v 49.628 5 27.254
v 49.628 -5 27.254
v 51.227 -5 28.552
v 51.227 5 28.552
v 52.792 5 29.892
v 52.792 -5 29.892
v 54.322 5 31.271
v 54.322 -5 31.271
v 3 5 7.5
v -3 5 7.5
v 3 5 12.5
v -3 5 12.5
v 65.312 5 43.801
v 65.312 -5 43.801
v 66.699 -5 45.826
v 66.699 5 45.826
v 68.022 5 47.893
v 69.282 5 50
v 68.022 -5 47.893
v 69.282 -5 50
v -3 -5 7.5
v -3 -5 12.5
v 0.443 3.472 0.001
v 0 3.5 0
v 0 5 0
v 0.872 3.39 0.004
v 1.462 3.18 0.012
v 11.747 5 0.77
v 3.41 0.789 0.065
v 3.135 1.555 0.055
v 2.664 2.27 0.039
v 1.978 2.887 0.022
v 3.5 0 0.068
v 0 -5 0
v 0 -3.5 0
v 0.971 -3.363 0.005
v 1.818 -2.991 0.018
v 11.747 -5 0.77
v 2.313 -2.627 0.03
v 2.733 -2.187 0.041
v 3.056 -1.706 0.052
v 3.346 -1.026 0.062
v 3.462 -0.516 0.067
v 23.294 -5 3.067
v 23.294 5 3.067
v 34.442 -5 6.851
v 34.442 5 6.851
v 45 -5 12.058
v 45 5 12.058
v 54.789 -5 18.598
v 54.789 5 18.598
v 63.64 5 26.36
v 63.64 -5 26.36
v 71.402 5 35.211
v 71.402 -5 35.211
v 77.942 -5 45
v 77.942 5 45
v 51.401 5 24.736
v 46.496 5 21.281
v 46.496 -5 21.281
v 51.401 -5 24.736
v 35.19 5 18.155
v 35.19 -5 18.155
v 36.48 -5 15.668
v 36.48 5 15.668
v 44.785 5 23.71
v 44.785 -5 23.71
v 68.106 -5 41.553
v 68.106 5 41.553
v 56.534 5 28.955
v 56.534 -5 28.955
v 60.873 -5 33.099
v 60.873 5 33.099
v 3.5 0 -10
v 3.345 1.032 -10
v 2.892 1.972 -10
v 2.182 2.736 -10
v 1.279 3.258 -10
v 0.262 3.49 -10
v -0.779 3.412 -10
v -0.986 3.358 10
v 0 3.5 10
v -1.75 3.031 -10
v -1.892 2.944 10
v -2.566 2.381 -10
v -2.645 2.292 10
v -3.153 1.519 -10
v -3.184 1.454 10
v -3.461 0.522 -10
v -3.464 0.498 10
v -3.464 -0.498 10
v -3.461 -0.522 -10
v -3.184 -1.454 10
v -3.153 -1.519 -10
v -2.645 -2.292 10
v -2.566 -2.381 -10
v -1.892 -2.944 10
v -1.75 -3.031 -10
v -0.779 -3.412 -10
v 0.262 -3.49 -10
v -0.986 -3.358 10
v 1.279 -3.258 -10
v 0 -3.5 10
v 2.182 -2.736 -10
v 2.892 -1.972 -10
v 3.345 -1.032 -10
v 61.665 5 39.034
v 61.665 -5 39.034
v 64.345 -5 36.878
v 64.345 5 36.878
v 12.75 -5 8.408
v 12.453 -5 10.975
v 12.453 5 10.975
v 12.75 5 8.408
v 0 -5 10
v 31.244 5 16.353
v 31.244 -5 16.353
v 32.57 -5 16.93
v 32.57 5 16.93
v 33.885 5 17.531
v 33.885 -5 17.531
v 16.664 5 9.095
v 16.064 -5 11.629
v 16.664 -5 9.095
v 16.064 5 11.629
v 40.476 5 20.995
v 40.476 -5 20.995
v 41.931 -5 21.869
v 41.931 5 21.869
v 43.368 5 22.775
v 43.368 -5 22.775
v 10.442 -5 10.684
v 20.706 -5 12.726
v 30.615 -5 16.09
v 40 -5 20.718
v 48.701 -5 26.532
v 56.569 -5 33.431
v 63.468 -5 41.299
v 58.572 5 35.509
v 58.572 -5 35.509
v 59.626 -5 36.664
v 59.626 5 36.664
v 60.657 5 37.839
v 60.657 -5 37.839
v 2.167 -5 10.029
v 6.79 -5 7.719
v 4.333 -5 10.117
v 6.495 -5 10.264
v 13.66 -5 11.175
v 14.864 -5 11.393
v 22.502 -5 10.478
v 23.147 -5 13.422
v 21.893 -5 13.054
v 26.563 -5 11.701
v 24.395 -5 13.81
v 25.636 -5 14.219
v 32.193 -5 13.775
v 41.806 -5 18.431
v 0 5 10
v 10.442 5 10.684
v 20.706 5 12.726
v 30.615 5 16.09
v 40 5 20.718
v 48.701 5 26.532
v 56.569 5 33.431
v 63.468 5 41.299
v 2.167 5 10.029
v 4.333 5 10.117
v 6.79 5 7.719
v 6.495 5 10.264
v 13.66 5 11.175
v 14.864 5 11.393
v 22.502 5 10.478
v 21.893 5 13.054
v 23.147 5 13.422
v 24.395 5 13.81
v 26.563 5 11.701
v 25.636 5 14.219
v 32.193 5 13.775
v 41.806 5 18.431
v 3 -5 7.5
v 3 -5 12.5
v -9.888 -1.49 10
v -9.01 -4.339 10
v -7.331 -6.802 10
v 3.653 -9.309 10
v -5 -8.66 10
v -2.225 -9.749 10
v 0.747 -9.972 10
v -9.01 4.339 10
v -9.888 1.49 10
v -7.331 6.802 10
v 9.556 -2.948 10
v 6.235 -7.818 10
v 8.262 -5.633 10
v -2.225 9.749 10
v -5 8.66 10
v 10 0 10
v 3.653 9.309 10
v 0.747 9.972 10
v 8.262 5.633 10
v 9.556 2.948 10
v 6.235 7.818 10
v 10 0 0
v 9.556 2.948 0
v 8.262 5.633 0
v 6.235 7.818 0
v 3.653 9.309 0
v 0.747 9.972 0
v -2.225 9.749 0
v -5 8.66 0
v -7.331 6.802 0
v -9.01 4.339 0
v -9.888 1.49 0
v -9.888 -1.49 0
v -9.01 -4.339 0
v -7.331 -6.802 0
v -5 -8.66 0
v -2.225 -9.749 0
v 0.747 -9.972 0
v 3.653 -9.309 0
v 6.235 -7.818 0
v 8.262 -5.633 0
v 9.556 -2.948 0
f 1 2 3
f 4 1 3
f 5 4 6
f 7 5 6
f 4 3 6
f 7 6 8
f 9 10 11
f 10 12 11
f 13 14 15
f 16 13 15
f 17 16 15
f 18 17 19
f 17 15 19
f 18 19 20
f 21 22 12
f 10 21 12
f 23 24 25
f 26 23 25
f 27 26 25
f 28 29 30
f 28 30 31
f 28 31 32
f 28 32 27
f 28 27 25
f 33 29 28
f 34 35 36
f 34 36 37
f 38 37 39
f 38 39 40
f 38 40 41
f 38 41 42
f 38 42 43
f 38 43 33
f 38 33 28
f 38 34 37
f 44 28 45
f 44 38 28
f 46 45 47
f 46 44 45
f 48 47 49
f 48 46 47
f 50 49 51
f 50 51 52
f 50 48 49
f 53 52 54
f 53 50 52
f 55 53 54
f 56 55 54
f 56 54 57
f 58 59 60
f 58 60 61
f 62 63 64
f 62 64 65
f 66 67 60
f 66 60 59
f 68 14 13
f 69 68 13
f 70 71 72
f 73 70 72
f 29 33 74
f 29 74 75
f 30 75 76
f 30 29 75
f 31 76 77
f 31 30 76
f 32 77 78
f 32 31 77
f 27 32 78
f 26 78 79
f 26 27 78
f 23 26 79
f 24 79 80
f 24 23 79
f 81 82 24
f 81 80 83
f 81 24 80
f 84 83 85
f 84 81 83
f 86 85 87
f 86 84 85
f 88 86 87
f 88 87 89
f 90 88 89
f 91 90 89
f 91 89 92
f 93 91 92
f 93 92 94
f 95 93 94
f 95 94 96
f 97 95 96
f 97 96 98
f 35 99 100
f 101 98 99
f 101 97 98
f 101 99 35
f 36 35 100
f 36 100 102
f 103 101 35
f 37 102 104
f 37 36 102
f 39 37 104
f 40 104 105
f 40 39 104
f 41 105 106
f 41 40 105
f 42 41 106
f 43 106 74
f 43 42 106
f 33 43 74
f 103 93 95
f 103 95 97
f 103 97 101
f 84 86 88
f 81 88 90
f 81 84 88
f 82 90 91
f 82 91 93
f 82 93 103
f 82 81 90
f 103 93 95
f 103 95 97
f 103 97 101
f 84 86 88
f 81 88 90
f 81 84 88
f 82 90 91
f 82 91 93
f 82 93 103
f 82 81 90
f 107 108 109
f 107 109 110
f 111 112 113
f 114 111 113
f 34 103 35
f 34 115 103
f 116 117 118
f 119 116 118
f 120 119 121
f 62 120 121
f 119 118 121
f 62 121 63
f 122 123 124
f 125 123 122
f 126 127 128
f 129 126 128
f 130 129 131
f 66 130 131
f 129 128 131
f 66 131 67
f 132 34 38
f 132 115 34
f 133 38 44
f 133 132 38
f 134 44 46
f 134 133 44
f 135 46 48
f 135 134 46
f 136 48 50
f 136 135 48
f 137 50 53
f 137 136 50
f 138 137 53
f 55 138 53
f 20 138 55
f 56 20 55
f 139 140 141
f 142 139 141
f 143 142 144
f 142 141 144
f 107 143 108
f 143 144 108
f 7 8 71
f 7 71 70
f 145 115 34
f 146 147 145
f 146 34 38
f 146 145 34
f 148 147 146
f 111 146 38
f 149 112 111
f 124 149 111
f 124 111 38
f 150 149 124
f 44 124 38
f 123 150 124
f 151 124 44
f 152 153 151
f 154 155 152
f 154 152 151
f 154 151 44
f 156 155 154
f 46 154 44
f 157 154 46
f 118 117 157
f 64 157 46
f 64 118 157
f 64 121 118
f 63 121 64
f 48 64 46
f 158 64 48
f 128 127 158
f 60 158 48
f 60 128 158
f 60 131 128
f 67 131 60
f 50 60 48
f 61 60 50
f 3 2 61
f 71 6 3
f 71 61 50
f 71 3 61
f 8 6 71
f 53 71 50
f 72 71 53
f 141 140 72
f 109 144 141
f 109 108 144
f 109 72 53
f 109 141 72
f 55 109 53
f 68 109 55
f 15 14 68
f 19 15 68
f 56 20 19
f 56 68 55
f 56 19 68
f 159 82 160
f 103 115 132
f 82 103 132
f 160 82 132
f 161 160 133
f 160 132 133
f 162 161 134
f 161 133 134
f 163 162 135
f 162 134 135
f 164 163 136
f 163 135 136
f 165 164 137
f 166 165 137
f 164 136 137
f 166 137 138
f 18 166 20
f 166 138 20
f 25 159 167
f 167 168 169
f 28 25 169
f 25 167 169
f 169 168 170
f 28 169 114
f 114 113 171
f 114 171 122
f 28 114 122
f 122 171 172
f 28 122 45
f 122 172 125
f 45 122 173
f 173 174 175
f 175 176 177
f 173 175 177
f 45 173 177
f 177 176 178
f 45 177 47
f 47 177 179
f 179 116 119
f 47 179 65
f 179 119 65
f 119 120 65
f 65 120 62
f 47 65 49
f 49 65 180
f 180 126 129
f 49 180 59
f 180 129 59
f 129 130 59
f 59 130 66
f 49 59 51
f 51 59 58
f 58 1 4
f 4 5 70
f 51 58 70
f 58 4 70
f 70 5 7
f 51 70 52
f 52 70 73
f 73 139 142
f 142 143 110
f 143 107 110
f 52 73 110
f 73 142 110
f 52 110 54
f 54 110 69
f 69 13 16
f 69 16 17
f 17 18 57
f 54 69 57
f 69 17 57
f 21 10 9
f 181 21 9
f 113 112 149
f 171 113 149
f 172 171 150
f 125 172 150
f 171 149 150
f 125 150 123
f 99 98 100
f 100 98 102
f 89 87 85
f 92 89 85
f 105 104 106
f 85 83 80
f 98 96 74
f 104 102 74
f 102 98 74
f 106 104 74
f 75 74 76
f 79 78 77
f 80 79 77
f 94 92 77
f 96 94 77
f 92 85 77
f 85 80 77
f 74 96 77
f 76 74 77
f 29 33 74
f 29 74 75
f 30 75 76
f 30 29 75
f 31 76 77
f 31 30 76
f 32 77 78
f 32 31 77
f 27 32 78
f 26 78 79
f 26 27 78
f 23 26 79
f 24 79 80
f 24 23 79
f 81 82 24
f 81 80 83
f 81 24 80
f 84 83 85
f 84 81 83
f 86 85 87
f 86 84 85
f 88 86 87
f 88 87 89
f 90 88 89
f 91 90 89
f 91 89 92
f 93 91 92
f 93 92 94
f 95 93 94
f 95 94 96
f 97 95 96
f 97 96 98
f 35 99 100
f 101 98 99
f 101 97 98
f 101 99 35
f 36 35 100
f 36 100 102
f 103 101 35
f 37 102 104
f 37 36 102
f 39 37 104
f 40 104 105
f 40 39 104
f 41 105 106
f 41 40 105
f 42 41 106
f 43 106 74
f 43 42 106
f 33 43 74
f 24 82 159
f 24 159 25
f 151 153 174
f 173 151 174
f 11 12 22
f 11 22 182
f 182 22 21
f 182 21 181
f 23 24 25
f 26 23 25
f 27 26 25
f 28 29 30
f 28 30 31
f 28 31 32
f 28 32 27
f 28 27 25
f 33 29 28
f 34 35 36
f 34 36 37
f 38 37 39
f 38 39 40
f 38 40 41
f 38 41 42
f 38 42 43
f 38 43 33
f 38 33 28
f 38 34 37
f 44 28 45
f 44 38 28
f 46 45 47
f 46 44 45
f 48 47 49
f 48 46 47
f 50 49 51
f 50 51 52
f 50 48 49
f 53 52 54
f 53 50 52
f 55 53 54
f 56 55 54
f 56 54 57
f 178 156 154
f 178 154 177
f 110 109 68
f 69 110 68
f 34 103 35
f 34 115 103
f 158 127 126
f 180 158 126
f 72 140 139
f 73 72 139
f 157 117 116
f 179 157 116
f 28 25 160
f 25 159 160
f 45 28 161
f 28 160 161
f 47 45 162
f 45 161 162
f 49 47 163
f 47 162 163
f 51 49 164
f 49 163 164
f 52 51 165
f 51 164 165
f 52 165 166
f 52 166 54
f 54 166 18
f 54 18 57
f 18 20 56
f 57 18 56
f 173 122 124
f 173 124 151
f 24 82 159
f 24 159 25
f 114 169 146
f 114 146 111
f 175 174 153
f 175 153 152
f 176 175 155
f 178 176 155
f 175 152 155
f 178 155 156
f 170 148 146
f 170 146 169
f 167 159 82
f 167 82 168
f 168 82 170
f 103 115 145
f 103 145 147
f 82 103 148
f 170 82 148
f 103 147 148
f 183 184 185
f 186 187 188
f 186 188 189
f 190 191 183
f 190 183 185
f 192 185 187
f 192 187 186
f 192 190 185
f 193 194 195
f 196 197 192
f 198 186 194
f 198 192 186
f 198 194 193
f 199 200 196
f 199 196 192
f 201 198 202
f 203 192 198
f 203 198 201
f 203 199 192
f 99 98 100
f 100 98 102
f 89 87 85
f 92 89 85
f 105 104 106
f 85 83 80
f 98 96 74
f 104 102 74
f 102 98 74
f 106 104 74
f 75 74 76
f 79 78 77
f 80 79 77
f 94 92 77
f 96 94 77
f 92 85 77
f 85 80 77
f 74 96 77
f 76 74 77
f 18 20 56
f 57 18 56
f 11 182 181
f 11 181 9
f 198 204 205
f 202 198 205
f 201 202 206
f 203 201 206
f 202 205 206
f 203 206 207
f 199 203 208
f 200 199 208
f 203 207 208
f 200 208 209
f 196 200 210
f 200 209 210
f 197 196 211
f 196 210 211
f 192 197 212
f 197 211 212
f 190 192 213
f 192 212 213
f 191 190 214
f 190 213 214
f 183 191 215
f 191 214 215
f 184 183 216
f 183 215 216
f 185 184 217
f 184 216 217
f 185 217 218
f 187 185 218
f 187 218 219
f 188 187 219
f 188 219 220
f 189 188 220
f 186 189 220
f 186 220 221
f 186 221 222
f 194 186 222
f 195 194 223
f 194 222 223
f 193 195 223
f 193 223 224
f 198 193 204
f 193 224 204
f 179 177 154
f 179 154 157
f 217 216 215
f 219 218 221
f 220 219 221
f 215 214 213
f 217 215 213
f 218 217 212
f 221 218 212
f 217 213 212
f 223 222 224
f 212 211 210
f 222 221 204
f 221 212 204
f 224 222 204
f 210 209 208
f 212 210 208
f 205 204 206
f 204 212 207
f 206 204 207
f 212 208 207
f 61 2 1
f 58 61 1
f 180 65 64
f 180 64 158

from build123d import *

# Parameters (mm, degrees)
SKETCH002_R                = 10
EXTRUDE003_DEPTH           = 10
EXTRUDE004_DEPTH           = 5
SKETCH004_R                = 3.5
EXTRUDE005_DEPTH           = 10
SKETCH006_W                = 6
SKETCH006_H                = 10
EXTRUDE007_DEPTH           = 2.5
SKETCH_R                   = 3.5
EXTRUDE001_DEPTH           = 10
SKETCH012_W                = 6
SKETCH012_H                = 10
EXTRUDE013_DEPTH           = 2.5
EXTRUDE013_PLACEMENT_ANGLE = 51.18
SKETCH011_W                = 6
SKETCH011_H                = 10
EXTRUDE012_DEPTH           = 2.5
EXTRUDE012_PLACEMENT_ANGLE = 43.68
SKETCH010_W                = 6
SKETCH010_H                = 10
EXTRUDE011_DEPTH           = 2.5
EXTRUDE011_PLACEMENT_ANGLE = 35.16
SKETCH009_W                = 6
SKETCH009_H                = 10
EXTRUDE010_DEPTH           = 2.5
EXTRUDE010_PLACEMENT_ANGLE = 27.42
SKETCH008_W                = 6
SKETCH008_H                = 10
EXTRUDE009_DEPTH           = 2.5
EXTRUDE009_PLACEMENT_ANGLE = 20.22
SKETCH007_W                = 6
SKETCH007_H                = 10
EXTRUDE008_DEPTH           = 2.5
EXTRUDE008_PLACEMENT_ANGLE = 13.32
SKETCH005_W                = 6
SKETCH005_H                = 10
EXTRUDE006_DEPTH           = 2.5
EXTRUDE006_PLACEMENT_ANGLE = 6.6
EXTRUDE002_DEPTH           = 5


with BuildPart() as extrude003:
    # Sketch002 → Extrude003 (new body)
    with BuildSketch(Plane.XY):
        Circle(SKETCH002_R)
    extrude(amount=EXTRUDE003_DEPTH)


with BuildPart() as extrude004:
    # Sketch003 → Extrude004 (new body, symmetric)
    with BuildSketch(Plane.XZ):
        with BuildLine():
            ThreePointArc((0, 0), (45.00001, 12.057678), (77.942322, 44.999938))
            Line((69.282072, 49.999945), (77.942322, 44.999938))
            ThreePointArc((0, 10), (40.000013, 20.717934), (69.282072, 49.999945))
            Line((0, 10), (0, 0))
        make_face()
    extrude(amount=EXTRUDE004_DEPTH, both=True)


with BuildPart() as fusion001:
    # Sketch004 → Extrude005 (new body, symmetric)
    with BuildSketch(Plane.XY):
        Circle(SKETCH004_R)
    extrude(amount=EXTRUDE005_DEPTH, both=True)

    # Fusion001: union Extrude004
    add(extrude004.part)


with BuildPart() as extrude007:
    # Sketch006 → Extrude007 (new body, symmetric)
    with BuildSketch(Plane.XY):
        Rectangle(SKETCH006_W, SKETCH006_H)
    extrude(amount=EXTRUDE007_DEPTH, both=True)


with BuildPart() as extrude007_1:
    # Extrude007 placement: moved
    add(extrude007.part.moved(Location((0, 0, 10))))


with BuildPart() as extrude001:
    # Sketch → Extrude001 (new body, symmetric)
    with BuildSketch(Plane.XY):
        Circle(SKETCH_R)
    extrude(amount=EXTRUDE001_DEPTH, both=True)


with BuildPart() as extrude013:
    # Sketch012 → Extrude013 (new body, symmetric)
    with BuildSketch(Plane.XY):
        Rectangle(SKETCH012_W, SKETCH012_H)
    extrude(amount=EXTRUDE013_DEPTH, both=True)


with BuildPart() as extrude013_1:
    # Extrude013 placement: moved
    add(extrude013.part.moved(Location((64.277333, 0, 40.782745))).rotate(Axis((64.277333, 0, 40.782745), (0, -1, 0)), EXTRUDE013_PLACEMENT_ANGLE))


with BuildPart() as extrude012:
    # Sketch011 → Extrude012 (new body, symmetric)
    with BuildSketch(Plane.XY):
        Rectangle(SKETCH011_W, SKETCH011_H)
    extrude(amount=EXTRUDE012_DEPTH, both=True)


with BuildPart() as extrude012_1:
    # Extrude012 placement: moved
    add(extrude012.part.moved(Location((56.976975, 0, 32.835318))).rotate(Axis((56.976975, 0, 32.835318), (0, -1, 0)), EXTRUDE012_PLACEMENT_ANGLE))


with BuildPart() as extrude011:
    # Sketch010 → Extrude011 (new body, symmetric)
    with BuildSketch(Plane.XY):
        Rectangle(SKETCH010_W, SKETCH010_H)
    extrude(amount=EXTRUDE011_DEPTH, both=True)


with BuildPart() as extrude011_1:
    # Extrude011 placement: moved
    add(extrude011.part.moved(Location((47.50859, 0, 25.052362))).rotate(Axis((47.50859, 0, 25.052362), (0, -1, 0)), EXTRUDE011_PLACEMENT_ANGLE))


with BuildPart() as extrude010:
    # Sketch009 → Extrude010 (new body, symmetric)
    with BuildSketch(Plane.XY):
        Rectangle(SKETCH009_W, SKETCH009_H)
    extrude(amount=EXTRUDE010_DEPTH, both=True)


with BuildPart() as extrude010_1:
    # Extrude010 placement: moved
    add(extrude010.part.moved(Location((37.992047, 0, 19.268488))).rotate(Axis((37.992047, 0, 19.268488), (0, -1, 0)), EXTRUDE010_PLACEMENT_ANGLE))


with BuildPart() as extrude009:
    # Sketch008 → Extrude009 (new body, symmetric)
    with BuildSketch(Plane.XY):
        Rectangle(SKETCH008_W, SKETCH008_H)
    extrude(amount=EXTRUDE009_DEPTH, both=True)


with BuildPart() as extrude009_1:
    # Extrude009 placement: moved
    add(extrude009.part.moved(Location((28.514126, 0, 15.084274))).rotate(Axis((28.514126, 0, 15.084274), (0, -1, 0)), EXTRUDE009_PLACEMENT_ANGLE))


with BuildPart() as extrude008:
    # Sketch007 → Extrude008 (new body, symmetric)
    with BuildSketch(Plane.XY):
        Rectangle(SKETCH007_W, SKETCH007_H)
    extrude(amount=EXTRUDE008_DEPTH, both=True)


with BuildPart() as extrude008_1:
    # Extrude008 placement: moved
    add(extrude008.part.moved(Location((19.007128, 0, 12.219373))).rotate(Axis((19.007128, 0, 12.219373), (0, -1, 0)), EXTRUDE008_PLACEMENT_ANGLE))


with BuildPart() as extrude006:
    # Sketch005 → Extrude006 (new body, symmetric)
    with BuildSketch(Plane.XY):
        Rectangle(SKETCH005_W, SKETCH005_H)
    extrude(amount=EXTRUDE006_DEPTH, both=True)


with BuildPart() as extrude006_1:
    # Extrude006 placement: moved
    add(extrude006.part.moved(Location((9.482315, 0, 10.546747))).rotate(Axis((9.482315, 0, 10.546747), (0, -1, 0)), EXTRUDE006_PLACEMENT_ANGLE))


with BuildPart() as fusion:
    # Sketch001 → Extrude002 (new body, symmetric)
    with BuildSketch(Plane.XZ):
        with BuildLine():
            ThreePointArc((0, 0), (45.00001, 12.057678), (77.942322, 44.999938))
            Line((69.282072, 49.999945), (77.942322, 44.999938))
            ThreePointArc((0, 10), (40.000013, 20.717934), (69.282072, 49.999945))
            Line((0, 10), (0, 0))
        make_face()
    extrude(amount=EXTRUDE002_DEPTH, both=True)

    # Cut: cut Extrude006
    add(extrude006_1.part, mode=Mode.SUBTRACT)

    # Cut001: cut Extrude008
    add(extrude008_1.part, mode=Mode.SUBTRACT)

    # Cut002: cut Extrude009
    add(extrude009_1.part, mode=Mode.SUBTRACT)

    # Cut003: cut Extrude010
    add(extrude010_1.part, mode=Mode.SUBTRACT)

    # Cut004: cut Extrude011
    add(extrude011_1.part, mode=Mode.SUBTRACT)

    # Cut005: cut Extrude012
    add(extrude012_1.part, mode=Mode.SUBTRACT)

    # Cut006: cut Extrude013
    add(extrude013_1.part, mode=Mode.SUBTRACT)

    # Fusion: union Extrude001
    add(extrude001.part)


solid = Compound([extrude003.part, fusion001.part, extrude007_1.part, fusion.part])
